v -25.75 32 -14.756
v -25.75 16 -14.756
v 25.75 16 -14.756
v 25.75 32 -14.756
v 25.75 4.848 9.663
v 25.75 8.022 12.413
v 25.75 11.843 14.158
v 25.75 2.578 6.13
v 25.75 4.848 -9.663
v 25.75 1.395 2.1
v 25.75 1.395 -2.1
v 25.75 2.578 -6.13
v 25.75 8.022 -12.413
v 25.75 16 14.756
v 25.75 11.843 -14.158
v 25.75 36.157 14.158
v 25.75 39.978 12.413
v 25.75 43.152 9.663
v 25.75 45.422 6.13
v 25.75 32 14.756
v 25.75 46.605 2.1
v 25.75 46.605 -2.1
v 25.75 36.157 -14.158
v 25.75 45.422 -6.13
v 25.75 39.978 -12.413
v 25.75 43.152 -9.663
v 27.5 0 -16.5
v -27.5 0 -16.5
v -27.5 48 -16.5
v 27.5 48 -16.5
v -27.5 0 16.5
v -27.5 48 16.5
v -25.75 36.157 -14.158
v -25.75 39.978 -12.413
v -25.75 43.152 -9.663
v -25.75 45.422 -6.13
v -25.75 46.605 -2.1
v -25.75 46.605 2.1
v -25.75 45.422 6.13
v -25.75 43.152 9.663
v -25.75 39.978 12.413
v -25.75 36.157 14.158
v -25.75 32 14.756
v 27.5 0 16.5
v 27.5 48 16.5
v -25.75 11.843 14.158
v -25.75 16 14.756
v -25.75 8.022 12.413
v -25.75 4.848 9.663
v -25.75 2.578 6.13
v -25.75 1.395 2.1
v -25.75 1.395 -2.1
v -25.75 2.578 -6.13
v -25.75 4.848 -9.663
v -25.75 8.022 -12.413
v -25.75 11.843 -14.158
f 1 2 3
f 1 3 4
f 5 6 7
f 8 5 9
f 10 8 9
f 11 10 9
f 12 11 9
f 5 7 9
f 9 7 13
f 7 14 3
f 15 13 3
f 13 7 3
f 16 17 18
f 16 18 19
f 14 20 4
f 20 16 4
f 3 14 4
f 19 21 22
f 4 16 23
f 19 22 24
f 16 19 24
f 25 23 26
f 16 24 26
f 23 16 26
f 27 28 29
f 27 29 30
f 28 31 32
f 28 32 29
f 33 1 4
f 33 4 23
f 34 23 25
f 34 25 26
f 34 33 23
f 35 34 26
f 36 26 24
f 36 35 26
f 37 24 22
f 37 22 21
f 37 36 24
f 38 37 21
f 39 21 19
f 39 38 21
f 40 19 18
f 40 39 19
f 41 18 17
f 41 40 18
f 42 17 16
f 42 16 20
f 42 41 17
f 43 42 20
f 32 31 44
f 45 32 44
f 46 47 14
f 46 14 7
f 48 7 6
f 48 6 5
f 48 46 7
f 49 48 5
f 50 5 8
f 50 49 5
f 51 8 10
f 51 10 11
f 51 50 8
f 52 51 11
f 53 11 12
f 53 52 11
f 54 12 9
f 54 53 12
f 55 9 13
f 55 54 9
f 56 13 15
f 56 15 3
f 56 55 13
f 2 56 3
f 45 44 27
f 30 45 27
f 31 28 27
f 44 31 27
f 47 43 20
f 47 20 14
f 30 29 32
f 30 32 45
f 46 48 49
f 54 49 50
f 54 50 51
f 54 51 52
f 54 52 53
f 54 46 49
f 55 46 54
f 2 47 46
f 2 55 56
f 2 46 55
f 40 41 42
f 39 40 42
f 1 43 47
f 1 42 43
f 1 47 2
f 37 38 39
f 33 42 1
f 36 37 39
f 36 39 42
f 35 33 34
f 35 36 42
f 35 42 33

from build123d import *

# Parameters (mm, degrees)
SKETCH1_W           = 55
SKETCH1_H           = 33
BOSS_EXTRUDE1_DEPTH = 48
CUT_EXTRUDE1_DEPTH  = 51.5


with BuildPart() as part:
    # Sketch1 → Boss-Extrude1 (new body)
    with BuildSketch(Plane(origin=(0, 0, 0), x_dir=(1, 0, 0), z_dir=(0, 1, 0))):
        Rectangle(SKETCH1_W, SKETCH1_H)
    extrude(amount=BOSS_EXTRUDE1_DEPTH)

    # Sketch2 → Cut-Extrude1 (cut)
    with BuildSketch(Plane.ZY.offset(25.75)):
        with BuildLine():
            Line((14.75565, 32), (14.75565, 16))
            ThreePointArc((14.75565, 16), (0, 1.24435), (-14.75565, 16))
            Line((-14.75565, 16), (-14.75565, 32))
            ThreePointArc((-14.75565, 32), (0, 46.75565), (14.75565, 32))
        make_face()
    extrude(amount=-CUT_EXTRUDE1_DEPTH, mode=Mode.SUBTRACT)


solid = part.part
